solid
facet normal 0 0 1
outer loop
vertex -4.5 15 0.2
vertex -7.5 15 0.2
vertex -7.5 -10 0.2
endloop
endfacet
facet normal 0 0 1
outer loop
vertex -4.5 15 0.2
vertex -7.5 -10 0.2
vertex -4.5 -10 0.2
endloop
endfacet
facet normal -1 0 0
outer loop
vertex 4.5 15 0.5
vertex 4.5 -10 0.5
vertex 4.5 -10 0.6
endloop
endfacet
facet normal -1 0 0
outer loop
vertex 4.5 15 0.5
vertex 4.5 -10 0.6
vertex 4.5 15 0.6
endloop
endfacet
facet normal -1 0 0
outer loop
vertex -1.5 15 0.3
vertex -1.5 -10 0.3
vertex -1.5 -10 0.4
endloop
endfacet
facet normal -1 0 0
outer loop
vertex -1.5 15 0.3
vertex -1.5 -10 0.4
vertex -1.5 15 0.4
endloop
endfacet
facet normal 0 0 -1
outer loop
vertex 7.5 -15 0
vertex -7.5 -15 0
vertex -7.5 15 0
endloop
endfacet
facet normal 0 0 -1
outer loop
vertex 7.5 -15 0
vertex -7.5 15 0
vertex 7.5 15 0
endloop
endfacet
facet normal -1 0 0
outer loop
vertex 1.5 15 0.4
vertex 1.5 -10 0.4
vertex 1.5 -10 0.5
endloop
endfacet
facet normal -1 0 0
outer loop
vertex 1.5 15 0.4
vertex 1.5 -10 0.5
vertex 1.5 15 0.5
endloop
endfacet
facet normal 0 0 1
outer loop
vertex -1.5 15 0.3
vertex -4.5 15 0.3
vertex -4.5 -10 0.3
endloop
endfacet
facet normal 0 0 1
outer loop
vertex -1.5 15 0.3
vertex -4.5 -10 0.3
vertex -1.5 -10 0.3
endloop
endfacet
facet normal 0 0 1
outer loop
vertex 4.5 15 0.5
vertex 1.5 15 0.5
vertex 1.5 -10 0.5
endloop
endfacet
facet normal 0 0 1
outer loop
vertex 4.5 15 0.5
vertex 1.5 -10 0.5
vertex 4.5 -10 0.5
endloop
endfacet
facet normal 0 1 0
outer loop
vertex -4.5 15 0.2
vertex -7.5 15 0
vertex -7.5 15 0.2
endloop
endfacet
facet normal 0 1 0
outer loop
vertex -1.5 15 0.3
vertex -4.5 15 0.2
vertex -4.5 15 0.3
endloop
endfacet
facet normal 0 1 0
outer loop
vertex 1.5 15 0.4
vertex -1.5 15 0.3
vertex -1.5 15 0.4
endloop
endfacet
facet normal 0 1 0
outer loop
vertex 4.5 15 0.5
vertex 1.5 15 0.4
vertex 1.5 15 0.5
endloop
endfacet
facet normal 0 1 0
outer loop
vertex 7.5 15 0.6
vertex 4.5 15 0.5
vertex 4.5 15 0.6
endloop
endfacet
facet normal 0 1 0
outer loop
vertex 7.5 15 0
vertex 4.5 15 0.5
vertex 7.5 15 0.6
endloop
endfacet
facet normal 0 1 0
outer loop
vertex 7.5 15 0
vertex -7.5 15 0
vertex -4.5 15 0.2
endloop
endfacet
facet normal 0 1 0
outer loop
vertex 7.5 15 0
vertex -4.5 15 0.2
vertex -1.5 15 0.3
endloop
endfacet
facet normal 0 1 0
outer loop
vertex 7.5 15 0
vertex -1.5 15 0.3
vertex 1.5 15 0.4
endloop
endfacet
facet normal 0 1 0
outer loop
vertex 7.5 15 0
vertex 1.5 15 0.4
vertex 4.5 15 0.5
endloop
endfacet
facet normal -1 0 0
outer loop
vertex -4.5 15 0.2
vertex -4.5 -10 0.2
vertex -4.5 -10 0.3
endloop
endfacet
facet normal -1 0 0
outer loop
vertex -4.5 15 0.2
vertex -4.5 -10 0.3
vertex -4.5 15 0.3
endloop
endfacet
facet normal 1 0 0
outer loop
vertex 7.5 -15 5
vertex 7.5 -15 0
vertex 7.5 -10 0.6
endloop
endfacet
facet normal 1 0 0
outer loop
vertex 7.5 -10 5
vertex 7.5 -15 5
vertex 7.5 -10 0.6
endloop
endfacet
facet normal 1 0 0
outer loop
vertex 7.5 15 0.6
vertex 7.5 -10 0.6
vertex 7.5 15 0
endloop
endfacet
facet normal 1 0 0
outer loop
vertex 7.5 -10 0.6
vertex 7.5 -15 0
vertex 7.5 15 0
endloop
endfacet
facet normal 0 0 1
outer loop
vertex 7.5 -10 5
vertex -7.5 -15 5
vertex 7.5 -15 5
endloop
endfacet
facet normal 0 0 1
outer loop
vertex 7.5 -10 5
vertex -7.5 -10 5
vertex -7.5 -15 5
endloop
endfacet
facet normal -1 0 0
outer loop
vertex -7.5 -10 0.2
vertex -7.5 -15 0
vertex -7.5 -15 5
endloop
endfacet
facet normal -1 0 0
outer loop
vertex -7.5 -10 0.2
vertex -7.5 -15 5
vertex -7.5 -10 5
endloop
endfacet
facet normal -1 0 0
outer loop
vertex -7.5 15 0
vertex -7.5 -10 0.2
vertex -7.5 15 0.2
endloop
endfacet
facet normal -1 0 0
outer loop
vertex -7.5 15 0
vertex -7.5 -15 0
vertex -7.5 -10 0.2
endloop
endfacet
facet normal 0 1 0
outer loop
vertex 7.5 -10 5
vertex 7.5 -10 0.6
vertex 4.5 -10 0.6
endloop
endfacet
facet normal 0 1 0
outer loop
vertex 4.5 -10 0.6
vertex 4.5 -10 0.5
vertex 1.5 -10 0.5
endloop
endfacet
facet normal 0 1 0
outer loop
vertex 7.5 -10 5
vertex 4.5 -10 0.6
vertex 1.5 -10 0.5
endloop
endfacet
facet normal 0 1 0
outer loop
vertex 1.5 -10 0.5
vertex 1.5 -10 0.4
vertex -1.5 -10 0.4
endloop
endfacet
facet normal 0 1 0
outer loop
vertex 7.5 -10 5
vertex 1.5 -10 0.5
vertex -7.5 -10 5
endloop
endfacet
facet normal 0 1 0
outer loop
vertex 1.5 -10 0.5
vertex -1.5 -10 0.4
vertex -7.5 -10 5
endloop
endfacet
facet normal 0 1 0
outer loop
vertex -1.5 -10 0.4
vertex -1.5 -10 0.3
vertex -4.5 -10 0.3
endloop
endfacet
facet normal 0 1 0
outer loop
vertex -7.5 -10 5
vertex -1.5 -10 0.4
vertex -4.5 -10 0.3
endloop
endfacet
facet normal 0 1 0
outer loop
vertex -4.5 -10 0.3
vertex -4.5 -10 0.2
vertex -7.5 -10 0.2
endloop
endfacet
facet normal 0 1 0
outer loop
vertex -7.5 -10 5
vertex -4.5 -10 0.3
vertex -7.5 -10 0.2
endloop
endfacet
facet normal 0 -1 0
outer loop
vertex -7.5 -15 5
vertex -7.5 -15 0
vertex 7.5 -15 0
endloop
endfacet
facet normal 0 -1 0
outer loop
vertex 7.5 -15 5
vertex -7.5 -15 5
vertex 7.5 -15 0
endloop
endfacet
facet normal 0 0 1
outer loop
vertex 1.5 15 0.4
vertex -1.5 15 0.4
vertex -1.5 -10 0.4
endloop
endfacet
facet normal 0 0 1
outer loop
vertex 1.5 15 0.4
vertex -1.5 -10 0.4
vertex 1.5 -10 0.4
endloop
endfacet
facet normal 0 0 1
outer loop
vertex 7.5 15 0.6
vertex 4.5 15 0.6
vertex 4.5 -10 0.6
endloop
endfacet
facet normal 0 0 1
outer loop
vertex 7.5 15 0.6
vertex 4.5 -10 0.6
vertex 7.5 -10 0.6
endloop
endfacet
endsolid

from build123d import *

# Parameters (mm, degrees)
F1_DEPTH = 5
F0_W     = 3
F0_H     = 25
F2_DEPTH = 0.2
F3_DEPTH = 0.3
F4_DEPTH = 0.4
F5_DEPTH = 0.5
F6_DEPTH = 0.6


with BuildPart() as f1:
    # F0 (on Top) → F1 (new body)
    with BuildSketch(Plane.XY):
        Polygon((-7.5, -15), (7.5, -15), (7.5, -10), (4.5, -10), (1.5, -10), (-1.5, -10), (-4.5, -10), (-7.5, -10), align=None)
    extrude(amount=F1_DEPTH)

    # F0 (on Top) → F2 (join)
    with BuildSketch(Plane.XY):
        with Locations((-6, 2.5)):
            Rectangle(F0_W, F0_H)
    extrude(amount=F2_DEPTH)

    # F0 (on Top) → F3 (join)
    with BuildSketch(Plane.XY):
        with Locations((-3, 2.5)):
            Rectangle(F0_W, F0_H)
    extrude(amount=F3_DEPTH)

    # F0 (on Top) → F4 (join)
    with BuildSketch(Plane.XY):
        with Locations((0, 2.5)):
            Rectangle(F0_W, F0_H)
    extrude(amount=F4_DEPTH)

    # F0 (on Top) → F5 (join)
    with BuildSketch(Plane.XY):
        with Locations((3, 2.5)):
            Rectangle(F0_W, F0_H)
    extrude(amount=F5_DEPTH)

    # F0 (on Top) → F6 (join)
    with BuildSketch(Plane.XY):
        with Locations((6, 2.5)):
            Rectangle(F0_W, F0_H)
    extrude(amount=F6_DEPTH)


solid = f1.part
